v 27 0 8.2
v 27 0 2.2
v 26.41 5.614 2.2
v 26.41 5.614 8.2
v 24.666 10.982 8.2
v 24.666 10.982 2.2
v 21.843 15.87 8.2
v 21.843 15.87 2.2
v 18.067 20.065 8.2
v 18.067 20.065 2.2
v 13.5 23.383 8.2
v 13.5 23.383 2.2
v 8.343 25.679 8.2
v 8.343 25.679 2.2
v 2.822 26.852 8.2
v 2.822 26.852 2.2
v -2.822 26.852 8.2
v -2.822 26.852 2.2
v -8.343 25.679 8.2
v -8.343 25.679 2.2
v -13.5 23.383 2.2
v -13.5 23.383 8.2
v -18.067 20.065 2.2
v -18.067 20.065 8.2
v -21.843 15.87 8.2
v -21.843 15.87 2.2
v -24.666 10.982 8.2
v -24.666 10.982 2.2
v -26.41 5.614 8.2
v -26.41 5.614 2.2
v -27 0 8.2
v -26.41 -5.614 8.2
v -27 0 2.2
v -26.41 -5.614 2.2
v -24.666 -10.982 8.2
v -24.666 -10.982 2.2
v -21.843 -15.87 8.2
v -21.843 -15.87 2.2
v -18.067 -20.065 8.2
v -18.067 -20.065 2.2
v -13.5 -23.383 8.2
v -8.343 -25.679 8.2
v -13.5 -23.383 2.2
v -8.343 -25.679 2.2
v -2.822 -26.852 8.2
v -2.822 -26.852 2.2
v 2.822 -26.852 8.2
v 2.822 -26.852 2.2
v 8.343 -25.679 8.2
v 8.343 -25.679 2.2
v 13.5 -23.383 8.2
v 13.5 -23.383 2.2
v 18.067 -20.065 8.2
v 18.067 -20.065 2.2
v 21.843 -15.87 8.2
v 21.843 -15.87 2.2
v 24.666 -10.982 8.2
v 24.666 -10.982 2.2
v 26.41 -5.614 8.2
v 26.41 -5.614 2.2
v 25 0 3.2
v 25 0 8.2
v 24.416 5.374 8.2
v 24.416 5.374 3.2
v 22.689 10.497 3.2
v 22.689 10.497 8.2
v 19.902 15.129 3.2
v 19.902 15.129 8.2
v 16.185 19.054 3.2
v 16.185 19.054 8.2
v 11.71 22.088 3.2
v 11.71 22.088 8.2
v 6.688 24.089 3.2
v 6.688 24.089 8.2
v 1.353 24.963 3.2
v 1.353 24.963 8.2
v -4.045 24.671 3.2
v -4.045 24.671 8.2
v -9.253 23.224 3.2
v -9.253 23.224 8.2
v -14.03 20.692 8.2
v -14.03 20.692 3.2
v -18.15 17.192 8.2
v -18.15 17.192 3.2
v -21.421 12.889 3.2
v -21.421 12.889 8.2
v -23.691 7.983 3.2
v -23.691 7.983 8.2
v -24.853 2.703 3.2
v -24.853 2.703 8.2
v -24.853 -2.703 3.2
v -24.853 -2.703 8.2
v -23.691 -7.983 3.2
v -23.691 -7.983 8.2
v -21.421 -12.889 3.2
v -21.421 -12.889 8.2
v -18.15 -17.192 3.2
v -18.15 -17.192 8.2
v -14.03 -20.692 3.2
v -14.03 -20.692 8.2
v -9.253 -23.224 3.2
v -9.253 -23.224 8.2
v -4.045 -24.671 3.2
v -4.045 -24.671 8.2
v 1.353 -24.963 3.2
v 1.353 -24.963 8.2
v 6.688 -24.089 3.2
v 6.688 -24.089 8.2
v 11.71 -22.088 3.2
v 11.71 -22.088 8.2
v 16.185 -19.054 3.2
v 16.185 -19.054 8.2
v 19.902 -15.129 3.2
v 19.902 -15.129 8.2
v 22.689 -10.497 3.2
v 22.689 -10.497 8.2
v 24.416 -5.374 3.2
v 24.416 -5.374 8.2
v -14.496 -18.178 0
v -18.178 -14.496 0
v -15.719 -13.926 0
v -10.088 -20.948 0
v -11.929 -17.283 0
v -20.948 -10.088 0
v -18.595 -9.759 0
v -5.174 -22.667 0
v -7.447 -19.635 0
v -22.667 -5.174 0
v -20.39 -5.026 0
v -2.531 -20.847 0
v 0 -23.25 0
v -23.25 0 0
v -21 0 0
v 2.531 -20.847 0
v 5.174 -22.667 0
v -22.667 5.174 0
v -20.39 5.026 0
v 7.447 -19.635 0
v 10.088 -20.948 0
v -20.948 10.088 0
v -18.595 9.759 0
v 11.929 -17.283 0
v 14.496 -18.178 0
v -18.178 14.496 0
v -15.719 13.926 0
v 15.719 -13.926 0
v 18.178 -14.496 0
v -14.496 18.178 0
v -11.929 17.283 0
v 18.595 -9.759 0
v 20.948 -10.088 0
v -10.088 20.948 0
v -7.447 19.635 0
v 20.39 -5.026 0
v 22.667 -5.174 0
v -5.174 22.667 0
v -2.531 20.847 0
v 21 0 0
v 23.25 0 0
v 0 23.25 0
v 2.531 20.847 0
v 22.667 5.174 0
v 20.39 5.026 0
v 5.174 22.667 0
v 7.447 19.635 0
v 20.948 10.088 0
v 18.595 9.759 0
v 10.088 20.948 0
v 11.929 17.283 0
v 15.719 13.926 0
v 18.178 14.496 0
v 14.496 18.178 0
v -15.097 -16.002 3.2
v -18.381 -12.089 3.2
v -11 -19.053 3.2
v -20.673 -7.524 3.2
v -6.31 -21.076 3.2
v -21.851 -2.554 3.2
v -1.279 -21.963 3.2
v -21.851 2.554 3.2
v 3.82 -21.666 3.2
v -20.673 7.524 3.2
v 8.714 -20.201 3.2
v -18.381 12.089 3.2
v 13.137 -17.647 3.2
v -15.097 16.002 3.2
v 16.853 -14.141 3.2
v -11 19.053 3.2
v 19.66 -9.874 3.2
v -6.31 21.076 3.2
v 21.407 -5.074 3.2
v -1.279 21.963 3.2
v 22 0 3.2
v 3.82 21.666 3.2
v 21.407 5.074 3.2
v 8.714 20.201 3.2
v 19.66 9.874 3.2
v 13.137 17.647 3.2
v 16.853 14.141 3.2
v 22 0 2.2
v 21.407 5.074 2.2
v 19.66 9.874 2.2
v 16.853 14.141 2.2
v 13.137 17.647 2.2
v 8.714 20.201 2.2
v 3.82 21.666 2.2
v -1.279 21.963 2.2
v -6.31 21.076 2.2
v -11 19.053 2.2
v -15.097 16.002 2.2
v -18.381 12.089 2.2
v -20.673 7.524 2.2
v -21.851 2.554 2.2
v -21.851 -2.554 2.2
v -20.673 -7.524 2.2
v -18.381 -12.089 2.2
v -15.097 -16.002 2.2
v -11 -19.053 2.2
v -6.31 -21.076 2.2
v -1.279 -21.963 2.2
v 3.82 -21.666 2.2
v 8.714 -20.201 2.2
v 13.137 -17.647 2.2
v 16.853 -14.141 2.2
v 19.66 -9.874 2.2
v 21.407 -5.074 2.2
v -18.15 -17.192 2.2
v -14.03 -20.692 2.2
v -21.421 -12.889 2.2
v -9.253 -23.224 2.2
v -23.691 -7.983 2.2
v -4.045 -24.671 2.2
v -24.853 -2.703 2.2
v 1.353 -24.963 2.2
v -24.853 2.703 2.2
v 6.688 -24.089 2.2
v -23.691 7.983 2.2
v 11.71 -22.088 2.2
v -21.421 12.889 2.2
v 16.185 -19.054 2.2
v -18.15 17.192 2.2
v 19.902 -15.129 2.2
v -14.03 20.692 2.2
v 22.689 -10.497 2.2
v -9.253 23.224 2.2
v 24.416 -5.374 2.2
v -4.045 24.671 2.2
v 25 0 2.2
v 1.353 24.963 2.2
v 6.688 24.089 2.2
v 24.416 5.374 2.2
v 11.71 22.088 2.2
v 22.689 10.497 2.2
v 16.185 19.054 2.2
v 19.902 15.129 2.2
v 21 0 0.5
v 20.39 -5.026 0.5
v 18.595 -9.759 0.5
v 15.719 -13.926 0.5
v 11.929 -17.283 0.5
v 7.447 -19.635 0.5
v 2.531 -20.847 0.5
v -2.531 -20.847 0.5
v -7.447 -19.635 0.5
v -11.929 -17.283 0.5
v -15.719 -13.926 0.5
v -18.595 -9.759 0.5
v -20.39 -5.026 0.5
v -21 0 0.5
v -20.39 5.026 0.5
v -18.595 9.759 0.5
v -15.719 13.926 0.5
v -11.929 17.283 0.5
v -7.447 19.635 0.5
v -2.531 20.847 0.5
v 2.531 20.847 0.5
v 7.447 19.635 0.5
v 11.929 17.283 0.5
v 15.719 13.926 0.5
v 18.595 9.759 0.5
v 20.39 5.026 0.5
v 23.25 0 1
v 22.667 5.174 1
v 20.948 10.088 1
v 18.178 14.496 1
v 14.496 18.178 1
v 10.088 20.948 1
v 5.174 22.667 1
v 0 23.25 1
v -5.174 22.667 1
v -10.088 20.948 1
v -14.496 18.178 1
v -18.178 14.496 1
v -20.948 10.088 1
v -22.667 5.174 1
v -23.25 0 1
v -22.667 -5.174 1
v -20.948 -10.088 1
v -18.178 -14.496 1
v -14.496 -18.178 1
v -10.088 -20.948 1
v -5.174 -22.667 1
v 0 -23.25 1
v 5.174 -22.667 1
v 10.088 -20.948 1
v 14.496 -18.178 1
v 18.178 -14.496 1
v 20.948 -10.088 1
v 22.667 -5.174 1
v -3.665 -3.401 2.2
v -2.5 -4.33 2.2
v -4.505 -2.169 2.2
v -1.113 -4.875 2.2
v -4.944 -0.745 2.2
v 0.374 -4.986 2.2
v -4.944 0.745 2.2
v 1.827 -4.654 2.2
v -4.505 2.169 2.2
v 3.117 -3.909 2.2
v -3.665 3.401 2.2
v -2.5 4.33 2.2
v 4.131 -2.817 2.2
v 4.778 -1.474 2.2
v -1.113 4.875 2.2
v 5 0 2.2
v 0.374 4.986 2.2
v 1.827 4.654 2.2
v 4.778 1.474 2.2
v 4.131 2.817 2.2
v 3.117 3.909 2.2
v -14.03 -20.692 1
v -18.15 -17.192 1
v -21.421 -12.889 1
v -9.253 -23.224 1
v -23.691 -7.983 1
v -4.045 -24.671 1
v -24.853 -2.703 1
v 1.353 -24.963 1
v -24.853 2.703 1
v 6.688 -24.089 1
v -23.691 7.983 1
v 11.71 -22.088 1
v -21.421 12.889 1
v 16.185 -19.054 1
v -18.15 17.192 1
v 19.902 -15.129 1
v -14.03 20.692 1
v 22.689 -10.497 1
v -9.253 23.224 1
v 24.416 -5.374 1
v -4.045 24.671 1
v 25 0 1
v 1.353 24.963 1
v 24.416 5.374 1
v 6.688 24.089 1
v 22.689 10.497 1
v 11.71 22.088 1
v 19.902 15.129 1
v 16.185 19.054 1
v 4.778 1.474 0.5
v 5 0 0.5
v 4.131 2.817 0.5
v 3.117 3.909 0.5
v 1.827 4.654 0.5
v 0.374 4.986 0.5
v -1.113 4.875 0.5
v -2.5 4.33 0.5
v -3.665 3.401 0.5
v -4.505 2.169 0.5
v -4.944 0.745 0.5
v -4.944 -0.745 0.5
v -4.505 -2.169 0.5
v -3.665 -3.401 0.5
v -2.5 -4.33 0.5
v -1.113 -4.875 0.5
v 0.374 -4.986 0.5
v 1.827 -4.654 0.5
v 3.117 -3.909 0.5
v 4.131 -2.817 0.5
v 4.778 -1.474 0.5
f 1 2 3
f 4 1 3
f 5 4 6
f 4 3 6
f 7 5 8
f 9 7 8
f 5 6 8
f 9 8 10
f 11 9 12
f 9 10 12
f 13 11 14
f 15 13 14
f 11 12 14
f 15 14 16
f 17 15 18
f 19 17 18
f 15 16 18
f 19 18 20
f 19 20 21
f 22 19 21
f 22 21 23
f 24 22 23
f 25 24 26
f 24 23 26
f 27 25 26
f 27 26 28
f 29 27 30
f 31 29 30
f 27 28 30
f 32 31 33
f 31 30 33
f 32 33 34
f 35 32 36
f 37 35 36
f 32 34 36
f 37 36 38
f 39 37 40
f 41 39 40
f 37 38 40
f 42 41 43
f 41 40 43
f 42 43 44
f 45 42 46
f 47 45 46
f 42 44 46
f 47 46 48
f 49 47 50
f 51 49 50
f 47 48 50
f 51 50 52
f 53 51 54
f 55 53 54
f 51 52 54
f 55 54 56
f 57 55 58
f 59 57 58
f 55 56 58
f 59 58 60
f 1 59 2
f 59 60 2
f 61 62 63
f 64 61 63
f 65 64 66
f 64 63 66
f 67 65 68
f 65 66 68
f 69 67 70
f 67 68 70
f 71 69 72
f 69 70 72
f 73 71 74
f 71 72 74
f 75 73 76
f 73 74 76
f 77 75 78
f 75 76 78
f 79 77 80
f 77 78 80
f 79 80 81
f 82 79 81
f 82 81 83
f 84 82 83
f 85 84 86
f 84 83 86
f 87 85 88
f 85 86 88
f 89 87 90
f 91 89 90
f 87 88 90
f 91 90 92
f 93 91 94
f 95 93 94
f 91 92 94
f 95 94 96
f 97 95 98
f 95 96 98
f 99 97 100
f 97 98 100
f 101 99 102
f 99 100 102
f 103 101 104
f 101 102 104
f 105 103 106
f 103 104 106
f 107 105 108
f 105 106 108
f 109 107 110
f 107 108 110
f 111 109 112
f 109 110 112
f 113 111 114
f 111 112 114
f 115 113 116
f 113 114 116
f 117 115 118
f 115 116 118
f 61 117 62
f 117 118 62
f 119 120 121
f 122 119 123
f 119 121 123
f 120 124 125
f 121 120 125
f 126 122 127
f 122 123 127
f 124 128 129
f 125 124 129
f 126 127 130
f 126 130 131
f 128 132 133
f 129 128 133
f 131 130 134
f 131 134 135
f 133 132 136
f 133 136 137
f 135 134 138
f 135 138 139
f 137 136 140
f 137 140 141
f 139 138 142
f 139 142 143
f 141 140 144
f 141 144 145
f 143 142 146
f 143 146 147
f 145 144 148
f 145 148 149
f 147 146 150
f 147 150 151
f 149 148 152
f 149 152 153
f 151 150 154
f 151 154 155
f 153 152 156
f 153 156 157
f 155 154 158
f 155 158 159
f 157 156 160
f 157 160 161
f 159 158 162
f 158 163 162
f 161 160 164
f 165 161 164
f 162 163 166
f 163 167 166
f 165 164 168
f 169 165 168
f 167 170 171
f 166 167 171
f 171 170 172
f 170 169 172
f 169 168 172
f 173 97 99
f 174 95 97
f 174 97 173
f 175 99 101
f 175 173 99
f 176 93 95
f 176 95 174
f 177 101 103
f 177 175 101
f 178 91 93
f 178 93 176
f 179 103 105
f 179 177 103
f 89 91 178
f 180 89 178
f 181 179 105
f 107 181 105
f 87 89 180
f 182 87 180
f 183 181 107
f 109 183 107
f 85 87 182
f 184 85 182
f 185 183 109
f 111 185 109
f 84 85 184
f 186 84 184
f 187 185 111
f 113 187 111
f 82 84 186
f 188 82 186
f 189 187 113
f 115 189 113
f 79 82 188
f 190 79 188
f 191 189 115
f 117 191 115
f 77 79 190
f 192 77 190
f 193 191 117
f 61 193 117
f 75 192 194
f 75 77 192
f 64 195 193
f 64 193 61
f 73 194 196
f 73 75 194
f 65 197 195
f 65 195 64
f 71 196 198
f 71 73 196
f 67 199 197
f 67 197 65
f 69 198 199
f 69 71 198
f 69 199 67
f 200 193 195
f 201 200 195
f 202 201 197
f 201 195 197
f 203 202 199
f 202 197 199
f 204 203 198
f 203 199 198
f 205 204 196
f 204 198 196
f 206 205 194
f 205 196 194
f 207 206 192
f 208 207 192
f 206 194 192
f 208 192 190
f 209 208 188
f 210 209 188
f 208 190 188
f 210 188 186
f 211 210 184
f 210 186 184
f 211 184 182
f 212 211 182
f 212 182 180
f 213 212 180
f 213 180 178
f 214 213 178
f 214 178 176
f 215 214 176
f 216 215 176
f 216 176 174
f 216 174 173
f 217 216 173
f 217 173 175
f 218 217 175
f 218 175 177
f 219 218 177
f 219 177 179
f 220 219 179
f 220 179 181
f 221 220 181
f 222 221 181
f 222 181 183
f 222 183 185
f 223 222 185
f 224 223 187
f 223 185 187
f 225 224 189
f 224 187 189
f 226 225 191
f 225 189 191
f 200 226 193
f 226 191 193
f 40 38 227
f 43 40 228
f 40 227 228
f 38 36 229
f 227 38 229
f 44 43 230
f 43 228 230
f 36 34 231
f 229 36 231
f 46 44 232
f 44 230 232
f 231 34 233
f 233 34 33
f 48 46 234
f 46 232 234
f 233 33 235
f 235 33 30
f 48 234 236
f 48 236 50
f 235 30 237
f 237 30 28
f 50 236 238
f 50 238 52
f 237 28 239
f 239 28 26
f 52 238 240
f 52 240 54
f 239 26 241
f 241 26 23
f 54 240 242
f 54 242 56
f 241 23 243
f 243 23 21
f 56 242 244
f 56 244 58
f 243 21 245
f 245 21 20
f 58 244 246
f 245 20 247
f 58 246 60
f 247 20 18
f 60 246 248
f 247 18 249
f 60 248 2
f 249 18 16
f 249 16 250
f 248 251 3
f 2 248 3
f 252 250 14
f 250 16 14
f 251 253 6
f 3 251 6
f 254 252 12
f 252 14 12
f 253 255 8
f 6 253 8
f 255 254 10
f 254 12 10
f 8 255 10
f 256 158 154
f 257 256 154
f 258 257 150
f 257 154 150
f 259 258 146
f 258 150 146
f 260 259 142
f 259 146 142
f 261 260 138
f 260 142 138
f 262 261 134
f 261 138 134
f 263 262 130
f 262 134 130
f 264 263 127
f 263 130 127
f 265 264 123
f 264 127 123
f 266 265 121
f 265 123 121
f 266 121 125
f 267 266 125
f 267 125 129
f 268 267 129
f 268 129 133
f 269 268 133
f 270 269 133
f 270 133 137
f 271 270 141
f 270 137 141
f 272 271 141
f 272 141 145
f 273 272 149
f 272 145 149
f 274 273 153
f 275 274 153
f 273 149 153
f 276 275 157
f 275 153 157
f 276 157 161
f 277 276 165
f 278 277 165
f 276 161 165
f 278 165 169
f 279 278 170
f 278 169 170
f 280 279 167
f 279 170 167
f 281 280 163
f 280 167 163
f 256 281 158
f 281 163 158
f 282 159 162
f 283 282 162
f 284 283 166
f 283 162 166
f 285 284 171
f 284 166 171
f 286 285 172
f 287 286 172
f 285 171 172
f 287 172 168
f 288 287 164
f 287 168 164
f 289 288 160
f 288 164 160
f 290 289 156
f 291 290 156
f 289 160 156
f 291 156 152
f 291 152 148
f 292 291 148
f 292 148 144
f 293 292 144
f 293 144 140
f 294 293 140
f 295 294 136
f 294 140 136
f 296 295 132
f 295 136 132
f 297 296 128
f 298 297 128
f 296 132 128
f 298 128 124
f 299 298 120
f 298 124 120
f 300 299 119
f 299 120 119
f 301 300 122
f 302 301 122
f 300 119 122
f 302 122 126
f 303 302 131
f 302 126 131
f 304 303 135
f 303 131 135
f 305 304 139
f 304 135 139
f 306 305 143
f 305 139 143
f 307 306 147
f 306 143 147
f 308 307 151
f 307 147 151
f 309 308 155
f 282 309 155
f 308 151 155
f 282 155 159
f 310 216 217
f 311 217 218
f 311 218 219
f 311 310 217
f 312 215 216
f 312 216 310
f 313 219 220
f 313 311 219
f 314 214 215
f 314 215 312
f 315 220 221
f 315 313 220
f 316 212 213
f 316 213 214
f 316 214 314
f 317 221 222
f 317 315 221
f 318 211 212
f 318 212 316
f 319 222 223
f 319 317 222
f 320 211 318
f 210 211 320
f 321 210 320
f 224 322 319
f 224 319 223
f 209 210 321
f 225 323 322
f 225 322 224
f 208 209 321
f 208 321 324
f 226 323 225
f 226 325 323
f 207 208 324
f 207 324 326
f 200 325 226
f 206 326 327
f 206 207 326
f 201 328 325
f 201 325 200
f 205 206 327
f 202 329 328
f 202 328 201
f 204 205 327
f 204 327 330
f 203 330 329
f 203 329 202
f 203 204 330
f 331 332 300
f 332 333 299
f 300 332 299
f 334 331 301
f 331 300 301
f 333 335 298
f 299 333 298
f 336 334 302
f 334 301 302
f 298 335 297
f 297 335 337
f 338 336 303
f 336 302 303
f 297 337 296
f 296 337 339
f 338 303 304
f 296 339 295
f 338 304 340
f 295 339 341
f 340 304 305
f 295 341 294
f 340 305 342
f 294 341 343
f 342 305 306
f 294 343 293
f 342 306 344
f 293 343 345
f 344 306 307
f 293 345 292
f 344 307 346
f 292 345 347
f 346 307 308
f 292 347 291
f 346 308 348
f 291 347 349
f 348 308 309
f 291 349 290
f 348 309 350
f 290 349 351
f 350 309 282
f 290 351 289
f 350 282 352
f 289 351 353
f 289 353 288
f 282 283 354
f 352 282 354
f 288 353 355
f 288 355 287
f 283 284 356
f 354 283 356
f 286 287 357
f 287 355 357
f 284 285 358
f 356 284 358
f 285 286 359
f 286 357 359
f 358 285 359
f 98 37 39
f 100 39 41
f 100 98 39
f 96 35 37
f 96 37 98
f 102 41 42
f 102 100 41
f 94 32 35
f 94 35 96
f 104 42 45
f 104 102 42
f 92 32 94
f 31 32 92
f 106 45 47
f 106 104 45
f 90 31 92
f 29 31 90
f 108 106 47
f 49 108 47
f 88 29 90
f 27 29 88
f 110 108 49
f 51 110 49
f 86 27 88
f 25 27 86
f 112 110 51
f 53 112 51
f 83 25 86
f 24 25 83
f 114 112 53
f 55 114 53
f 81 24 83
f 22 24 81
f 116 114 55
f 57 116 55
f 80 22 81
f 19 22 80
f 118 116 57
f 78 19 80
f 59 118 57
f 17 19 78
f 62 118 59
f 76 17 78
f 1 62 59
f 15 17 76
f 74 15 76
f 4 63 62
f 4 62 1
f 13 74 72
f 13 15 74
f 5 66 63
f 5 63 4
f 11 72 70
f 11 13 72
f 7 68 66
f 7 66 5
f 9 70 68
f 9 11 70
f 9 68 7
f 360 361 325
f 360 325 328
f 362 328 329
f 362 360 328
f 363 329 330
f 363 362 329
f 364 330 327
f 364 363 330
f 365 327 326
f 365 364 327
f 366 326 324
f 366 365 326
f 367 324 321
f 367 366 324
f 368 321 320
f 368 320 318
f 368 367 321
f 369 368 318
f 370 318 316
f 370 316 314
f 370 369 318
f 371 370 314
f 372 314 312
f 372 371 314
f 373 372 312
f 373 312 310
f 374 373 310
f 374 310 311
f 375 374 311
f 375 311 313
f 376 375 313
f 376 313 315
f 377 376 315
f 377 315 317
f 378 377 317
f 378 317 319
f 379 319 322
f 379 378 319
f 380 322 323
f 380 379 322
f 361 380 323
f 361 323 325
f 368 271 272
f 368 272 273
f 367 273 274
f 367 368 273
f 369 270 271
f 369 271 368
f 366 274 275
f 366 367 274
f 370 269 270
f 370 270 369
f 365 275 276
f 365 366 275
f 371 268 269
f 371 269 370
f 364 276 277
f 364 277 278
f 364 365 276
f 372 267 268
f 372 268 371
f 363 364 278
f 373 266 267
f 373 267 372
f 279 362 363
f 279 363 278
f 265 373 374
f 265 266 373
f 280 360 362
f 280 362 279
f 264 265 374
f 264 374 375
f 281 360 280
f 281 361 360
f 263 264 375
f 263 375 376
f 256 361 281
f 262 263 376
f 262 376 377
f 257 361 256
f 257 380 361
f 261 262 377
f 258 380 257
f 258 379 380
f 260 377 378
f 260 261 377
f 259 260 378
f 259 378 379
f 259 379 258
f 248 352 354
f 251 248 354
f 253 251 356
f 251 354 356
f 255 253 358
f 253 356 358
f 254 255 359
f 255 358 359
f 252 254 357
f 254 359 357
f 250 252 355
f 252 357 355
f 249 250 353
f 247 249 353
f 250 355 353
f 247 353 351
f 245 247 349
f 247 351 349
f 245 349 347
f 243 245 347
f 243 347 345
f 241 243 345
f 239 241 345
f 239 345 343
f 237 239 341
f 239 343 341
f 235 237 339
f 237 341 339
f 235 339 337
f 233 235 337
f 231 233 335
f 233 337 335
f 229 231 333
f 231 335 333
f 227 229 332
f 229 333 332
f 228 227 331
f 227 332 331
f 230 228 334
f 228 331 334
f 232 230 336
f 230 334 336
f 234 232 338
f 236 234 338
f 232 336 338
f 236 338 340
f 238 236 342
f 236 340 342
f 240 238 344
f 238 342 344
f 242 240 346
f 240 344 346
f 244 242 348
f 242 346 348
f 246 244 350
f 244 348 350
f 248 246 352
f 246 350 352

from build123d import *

# Parameters (mm, degrees)
F0_R      = 23.25
F0_R_2    = 5
F1_DEPTH  = 1
F2_R      = 25
F2_R_2    = 23.25
F2_R_3    = 5
F3_DEPTH  = 1.2
F4_R      = 27
F4_R_2    = 25
F4_R_3    = 5
F5_DEPTH  = 6
F6_R      = 22
F6_R_2    = 5
F7_DEPTH  = 6
F8_R      = 25
F8_R_2    = 22
F9_DEPTH  = 5
F10_R     = 21
F10_R_2   = 5
F11_DEPTH = 0.5


with BuildPart() as f1:
    # F0 (on Top) → F1 (new body)
    with BuildSketch(Plane.XY):
        Circle(F0_R)
        Circle(F0_R_2, mode=Mode.SUBTRACT)
    extrude(amount=F1_DEPTH)

    # F2 (on face) → F3 (join)
    with BuildSketch(Plane.XY.offset(1)):
        Circle(F2_R)
        Circle(F2_R_2, mode=Mode.SUBTRACT)
        Circle(F2_R_2)
        Circle(F2_R_3, mode=Mode.SUBTRACT)
    extrude(amount=F3_DEPTH)

    # F4 (on face) → F5 (join)
    with BuildSketch(Plane.XY.offset(2.2)):
        Circle(F4_R)
        Circle(F4_R_2, mode=Mode.SUBTRACT)
        Circle(F4_R_2)
        Circle(F4_R_3, mode=Mode.SUBTRACT)
    extrude(amount=F5_DEPTH)

    # F6 (on face) → F7 (cut)
    with BuildSketch(Plane.XY.offset(8.2)):
        Circle(F6_R)
        Circle(F6_R_2, mode=Mode.SUBTRACT)
    extrude(amount=-F7_DEPTH, mode=Mode.SUBTRACT)

    # F8 (on face) → F9 (cut)
    with BuildSketch(Plane.XY.offset(8.2)):
        Circle(F8_R)
        Circle(F8_R_2, mode=Mode.SUBTRACT)
    extrude(amount=-F9_DEPTH, mode=Mode.SUBTRACT)

    # F10 (on face) → F11 (cut)
    with BuildSketch(Plane(origin=(0, 0, 0), x_dir=(1, 0, 0), z_dir=(0, 0, -1))):
        Circle(F10_R)
        Circle(F10_R_2, mode=Mode.SUBTRACT)
    extrude(amount=-F11_DEPTH, mode=Mode.SUBTRACT)


solid = f1.part
